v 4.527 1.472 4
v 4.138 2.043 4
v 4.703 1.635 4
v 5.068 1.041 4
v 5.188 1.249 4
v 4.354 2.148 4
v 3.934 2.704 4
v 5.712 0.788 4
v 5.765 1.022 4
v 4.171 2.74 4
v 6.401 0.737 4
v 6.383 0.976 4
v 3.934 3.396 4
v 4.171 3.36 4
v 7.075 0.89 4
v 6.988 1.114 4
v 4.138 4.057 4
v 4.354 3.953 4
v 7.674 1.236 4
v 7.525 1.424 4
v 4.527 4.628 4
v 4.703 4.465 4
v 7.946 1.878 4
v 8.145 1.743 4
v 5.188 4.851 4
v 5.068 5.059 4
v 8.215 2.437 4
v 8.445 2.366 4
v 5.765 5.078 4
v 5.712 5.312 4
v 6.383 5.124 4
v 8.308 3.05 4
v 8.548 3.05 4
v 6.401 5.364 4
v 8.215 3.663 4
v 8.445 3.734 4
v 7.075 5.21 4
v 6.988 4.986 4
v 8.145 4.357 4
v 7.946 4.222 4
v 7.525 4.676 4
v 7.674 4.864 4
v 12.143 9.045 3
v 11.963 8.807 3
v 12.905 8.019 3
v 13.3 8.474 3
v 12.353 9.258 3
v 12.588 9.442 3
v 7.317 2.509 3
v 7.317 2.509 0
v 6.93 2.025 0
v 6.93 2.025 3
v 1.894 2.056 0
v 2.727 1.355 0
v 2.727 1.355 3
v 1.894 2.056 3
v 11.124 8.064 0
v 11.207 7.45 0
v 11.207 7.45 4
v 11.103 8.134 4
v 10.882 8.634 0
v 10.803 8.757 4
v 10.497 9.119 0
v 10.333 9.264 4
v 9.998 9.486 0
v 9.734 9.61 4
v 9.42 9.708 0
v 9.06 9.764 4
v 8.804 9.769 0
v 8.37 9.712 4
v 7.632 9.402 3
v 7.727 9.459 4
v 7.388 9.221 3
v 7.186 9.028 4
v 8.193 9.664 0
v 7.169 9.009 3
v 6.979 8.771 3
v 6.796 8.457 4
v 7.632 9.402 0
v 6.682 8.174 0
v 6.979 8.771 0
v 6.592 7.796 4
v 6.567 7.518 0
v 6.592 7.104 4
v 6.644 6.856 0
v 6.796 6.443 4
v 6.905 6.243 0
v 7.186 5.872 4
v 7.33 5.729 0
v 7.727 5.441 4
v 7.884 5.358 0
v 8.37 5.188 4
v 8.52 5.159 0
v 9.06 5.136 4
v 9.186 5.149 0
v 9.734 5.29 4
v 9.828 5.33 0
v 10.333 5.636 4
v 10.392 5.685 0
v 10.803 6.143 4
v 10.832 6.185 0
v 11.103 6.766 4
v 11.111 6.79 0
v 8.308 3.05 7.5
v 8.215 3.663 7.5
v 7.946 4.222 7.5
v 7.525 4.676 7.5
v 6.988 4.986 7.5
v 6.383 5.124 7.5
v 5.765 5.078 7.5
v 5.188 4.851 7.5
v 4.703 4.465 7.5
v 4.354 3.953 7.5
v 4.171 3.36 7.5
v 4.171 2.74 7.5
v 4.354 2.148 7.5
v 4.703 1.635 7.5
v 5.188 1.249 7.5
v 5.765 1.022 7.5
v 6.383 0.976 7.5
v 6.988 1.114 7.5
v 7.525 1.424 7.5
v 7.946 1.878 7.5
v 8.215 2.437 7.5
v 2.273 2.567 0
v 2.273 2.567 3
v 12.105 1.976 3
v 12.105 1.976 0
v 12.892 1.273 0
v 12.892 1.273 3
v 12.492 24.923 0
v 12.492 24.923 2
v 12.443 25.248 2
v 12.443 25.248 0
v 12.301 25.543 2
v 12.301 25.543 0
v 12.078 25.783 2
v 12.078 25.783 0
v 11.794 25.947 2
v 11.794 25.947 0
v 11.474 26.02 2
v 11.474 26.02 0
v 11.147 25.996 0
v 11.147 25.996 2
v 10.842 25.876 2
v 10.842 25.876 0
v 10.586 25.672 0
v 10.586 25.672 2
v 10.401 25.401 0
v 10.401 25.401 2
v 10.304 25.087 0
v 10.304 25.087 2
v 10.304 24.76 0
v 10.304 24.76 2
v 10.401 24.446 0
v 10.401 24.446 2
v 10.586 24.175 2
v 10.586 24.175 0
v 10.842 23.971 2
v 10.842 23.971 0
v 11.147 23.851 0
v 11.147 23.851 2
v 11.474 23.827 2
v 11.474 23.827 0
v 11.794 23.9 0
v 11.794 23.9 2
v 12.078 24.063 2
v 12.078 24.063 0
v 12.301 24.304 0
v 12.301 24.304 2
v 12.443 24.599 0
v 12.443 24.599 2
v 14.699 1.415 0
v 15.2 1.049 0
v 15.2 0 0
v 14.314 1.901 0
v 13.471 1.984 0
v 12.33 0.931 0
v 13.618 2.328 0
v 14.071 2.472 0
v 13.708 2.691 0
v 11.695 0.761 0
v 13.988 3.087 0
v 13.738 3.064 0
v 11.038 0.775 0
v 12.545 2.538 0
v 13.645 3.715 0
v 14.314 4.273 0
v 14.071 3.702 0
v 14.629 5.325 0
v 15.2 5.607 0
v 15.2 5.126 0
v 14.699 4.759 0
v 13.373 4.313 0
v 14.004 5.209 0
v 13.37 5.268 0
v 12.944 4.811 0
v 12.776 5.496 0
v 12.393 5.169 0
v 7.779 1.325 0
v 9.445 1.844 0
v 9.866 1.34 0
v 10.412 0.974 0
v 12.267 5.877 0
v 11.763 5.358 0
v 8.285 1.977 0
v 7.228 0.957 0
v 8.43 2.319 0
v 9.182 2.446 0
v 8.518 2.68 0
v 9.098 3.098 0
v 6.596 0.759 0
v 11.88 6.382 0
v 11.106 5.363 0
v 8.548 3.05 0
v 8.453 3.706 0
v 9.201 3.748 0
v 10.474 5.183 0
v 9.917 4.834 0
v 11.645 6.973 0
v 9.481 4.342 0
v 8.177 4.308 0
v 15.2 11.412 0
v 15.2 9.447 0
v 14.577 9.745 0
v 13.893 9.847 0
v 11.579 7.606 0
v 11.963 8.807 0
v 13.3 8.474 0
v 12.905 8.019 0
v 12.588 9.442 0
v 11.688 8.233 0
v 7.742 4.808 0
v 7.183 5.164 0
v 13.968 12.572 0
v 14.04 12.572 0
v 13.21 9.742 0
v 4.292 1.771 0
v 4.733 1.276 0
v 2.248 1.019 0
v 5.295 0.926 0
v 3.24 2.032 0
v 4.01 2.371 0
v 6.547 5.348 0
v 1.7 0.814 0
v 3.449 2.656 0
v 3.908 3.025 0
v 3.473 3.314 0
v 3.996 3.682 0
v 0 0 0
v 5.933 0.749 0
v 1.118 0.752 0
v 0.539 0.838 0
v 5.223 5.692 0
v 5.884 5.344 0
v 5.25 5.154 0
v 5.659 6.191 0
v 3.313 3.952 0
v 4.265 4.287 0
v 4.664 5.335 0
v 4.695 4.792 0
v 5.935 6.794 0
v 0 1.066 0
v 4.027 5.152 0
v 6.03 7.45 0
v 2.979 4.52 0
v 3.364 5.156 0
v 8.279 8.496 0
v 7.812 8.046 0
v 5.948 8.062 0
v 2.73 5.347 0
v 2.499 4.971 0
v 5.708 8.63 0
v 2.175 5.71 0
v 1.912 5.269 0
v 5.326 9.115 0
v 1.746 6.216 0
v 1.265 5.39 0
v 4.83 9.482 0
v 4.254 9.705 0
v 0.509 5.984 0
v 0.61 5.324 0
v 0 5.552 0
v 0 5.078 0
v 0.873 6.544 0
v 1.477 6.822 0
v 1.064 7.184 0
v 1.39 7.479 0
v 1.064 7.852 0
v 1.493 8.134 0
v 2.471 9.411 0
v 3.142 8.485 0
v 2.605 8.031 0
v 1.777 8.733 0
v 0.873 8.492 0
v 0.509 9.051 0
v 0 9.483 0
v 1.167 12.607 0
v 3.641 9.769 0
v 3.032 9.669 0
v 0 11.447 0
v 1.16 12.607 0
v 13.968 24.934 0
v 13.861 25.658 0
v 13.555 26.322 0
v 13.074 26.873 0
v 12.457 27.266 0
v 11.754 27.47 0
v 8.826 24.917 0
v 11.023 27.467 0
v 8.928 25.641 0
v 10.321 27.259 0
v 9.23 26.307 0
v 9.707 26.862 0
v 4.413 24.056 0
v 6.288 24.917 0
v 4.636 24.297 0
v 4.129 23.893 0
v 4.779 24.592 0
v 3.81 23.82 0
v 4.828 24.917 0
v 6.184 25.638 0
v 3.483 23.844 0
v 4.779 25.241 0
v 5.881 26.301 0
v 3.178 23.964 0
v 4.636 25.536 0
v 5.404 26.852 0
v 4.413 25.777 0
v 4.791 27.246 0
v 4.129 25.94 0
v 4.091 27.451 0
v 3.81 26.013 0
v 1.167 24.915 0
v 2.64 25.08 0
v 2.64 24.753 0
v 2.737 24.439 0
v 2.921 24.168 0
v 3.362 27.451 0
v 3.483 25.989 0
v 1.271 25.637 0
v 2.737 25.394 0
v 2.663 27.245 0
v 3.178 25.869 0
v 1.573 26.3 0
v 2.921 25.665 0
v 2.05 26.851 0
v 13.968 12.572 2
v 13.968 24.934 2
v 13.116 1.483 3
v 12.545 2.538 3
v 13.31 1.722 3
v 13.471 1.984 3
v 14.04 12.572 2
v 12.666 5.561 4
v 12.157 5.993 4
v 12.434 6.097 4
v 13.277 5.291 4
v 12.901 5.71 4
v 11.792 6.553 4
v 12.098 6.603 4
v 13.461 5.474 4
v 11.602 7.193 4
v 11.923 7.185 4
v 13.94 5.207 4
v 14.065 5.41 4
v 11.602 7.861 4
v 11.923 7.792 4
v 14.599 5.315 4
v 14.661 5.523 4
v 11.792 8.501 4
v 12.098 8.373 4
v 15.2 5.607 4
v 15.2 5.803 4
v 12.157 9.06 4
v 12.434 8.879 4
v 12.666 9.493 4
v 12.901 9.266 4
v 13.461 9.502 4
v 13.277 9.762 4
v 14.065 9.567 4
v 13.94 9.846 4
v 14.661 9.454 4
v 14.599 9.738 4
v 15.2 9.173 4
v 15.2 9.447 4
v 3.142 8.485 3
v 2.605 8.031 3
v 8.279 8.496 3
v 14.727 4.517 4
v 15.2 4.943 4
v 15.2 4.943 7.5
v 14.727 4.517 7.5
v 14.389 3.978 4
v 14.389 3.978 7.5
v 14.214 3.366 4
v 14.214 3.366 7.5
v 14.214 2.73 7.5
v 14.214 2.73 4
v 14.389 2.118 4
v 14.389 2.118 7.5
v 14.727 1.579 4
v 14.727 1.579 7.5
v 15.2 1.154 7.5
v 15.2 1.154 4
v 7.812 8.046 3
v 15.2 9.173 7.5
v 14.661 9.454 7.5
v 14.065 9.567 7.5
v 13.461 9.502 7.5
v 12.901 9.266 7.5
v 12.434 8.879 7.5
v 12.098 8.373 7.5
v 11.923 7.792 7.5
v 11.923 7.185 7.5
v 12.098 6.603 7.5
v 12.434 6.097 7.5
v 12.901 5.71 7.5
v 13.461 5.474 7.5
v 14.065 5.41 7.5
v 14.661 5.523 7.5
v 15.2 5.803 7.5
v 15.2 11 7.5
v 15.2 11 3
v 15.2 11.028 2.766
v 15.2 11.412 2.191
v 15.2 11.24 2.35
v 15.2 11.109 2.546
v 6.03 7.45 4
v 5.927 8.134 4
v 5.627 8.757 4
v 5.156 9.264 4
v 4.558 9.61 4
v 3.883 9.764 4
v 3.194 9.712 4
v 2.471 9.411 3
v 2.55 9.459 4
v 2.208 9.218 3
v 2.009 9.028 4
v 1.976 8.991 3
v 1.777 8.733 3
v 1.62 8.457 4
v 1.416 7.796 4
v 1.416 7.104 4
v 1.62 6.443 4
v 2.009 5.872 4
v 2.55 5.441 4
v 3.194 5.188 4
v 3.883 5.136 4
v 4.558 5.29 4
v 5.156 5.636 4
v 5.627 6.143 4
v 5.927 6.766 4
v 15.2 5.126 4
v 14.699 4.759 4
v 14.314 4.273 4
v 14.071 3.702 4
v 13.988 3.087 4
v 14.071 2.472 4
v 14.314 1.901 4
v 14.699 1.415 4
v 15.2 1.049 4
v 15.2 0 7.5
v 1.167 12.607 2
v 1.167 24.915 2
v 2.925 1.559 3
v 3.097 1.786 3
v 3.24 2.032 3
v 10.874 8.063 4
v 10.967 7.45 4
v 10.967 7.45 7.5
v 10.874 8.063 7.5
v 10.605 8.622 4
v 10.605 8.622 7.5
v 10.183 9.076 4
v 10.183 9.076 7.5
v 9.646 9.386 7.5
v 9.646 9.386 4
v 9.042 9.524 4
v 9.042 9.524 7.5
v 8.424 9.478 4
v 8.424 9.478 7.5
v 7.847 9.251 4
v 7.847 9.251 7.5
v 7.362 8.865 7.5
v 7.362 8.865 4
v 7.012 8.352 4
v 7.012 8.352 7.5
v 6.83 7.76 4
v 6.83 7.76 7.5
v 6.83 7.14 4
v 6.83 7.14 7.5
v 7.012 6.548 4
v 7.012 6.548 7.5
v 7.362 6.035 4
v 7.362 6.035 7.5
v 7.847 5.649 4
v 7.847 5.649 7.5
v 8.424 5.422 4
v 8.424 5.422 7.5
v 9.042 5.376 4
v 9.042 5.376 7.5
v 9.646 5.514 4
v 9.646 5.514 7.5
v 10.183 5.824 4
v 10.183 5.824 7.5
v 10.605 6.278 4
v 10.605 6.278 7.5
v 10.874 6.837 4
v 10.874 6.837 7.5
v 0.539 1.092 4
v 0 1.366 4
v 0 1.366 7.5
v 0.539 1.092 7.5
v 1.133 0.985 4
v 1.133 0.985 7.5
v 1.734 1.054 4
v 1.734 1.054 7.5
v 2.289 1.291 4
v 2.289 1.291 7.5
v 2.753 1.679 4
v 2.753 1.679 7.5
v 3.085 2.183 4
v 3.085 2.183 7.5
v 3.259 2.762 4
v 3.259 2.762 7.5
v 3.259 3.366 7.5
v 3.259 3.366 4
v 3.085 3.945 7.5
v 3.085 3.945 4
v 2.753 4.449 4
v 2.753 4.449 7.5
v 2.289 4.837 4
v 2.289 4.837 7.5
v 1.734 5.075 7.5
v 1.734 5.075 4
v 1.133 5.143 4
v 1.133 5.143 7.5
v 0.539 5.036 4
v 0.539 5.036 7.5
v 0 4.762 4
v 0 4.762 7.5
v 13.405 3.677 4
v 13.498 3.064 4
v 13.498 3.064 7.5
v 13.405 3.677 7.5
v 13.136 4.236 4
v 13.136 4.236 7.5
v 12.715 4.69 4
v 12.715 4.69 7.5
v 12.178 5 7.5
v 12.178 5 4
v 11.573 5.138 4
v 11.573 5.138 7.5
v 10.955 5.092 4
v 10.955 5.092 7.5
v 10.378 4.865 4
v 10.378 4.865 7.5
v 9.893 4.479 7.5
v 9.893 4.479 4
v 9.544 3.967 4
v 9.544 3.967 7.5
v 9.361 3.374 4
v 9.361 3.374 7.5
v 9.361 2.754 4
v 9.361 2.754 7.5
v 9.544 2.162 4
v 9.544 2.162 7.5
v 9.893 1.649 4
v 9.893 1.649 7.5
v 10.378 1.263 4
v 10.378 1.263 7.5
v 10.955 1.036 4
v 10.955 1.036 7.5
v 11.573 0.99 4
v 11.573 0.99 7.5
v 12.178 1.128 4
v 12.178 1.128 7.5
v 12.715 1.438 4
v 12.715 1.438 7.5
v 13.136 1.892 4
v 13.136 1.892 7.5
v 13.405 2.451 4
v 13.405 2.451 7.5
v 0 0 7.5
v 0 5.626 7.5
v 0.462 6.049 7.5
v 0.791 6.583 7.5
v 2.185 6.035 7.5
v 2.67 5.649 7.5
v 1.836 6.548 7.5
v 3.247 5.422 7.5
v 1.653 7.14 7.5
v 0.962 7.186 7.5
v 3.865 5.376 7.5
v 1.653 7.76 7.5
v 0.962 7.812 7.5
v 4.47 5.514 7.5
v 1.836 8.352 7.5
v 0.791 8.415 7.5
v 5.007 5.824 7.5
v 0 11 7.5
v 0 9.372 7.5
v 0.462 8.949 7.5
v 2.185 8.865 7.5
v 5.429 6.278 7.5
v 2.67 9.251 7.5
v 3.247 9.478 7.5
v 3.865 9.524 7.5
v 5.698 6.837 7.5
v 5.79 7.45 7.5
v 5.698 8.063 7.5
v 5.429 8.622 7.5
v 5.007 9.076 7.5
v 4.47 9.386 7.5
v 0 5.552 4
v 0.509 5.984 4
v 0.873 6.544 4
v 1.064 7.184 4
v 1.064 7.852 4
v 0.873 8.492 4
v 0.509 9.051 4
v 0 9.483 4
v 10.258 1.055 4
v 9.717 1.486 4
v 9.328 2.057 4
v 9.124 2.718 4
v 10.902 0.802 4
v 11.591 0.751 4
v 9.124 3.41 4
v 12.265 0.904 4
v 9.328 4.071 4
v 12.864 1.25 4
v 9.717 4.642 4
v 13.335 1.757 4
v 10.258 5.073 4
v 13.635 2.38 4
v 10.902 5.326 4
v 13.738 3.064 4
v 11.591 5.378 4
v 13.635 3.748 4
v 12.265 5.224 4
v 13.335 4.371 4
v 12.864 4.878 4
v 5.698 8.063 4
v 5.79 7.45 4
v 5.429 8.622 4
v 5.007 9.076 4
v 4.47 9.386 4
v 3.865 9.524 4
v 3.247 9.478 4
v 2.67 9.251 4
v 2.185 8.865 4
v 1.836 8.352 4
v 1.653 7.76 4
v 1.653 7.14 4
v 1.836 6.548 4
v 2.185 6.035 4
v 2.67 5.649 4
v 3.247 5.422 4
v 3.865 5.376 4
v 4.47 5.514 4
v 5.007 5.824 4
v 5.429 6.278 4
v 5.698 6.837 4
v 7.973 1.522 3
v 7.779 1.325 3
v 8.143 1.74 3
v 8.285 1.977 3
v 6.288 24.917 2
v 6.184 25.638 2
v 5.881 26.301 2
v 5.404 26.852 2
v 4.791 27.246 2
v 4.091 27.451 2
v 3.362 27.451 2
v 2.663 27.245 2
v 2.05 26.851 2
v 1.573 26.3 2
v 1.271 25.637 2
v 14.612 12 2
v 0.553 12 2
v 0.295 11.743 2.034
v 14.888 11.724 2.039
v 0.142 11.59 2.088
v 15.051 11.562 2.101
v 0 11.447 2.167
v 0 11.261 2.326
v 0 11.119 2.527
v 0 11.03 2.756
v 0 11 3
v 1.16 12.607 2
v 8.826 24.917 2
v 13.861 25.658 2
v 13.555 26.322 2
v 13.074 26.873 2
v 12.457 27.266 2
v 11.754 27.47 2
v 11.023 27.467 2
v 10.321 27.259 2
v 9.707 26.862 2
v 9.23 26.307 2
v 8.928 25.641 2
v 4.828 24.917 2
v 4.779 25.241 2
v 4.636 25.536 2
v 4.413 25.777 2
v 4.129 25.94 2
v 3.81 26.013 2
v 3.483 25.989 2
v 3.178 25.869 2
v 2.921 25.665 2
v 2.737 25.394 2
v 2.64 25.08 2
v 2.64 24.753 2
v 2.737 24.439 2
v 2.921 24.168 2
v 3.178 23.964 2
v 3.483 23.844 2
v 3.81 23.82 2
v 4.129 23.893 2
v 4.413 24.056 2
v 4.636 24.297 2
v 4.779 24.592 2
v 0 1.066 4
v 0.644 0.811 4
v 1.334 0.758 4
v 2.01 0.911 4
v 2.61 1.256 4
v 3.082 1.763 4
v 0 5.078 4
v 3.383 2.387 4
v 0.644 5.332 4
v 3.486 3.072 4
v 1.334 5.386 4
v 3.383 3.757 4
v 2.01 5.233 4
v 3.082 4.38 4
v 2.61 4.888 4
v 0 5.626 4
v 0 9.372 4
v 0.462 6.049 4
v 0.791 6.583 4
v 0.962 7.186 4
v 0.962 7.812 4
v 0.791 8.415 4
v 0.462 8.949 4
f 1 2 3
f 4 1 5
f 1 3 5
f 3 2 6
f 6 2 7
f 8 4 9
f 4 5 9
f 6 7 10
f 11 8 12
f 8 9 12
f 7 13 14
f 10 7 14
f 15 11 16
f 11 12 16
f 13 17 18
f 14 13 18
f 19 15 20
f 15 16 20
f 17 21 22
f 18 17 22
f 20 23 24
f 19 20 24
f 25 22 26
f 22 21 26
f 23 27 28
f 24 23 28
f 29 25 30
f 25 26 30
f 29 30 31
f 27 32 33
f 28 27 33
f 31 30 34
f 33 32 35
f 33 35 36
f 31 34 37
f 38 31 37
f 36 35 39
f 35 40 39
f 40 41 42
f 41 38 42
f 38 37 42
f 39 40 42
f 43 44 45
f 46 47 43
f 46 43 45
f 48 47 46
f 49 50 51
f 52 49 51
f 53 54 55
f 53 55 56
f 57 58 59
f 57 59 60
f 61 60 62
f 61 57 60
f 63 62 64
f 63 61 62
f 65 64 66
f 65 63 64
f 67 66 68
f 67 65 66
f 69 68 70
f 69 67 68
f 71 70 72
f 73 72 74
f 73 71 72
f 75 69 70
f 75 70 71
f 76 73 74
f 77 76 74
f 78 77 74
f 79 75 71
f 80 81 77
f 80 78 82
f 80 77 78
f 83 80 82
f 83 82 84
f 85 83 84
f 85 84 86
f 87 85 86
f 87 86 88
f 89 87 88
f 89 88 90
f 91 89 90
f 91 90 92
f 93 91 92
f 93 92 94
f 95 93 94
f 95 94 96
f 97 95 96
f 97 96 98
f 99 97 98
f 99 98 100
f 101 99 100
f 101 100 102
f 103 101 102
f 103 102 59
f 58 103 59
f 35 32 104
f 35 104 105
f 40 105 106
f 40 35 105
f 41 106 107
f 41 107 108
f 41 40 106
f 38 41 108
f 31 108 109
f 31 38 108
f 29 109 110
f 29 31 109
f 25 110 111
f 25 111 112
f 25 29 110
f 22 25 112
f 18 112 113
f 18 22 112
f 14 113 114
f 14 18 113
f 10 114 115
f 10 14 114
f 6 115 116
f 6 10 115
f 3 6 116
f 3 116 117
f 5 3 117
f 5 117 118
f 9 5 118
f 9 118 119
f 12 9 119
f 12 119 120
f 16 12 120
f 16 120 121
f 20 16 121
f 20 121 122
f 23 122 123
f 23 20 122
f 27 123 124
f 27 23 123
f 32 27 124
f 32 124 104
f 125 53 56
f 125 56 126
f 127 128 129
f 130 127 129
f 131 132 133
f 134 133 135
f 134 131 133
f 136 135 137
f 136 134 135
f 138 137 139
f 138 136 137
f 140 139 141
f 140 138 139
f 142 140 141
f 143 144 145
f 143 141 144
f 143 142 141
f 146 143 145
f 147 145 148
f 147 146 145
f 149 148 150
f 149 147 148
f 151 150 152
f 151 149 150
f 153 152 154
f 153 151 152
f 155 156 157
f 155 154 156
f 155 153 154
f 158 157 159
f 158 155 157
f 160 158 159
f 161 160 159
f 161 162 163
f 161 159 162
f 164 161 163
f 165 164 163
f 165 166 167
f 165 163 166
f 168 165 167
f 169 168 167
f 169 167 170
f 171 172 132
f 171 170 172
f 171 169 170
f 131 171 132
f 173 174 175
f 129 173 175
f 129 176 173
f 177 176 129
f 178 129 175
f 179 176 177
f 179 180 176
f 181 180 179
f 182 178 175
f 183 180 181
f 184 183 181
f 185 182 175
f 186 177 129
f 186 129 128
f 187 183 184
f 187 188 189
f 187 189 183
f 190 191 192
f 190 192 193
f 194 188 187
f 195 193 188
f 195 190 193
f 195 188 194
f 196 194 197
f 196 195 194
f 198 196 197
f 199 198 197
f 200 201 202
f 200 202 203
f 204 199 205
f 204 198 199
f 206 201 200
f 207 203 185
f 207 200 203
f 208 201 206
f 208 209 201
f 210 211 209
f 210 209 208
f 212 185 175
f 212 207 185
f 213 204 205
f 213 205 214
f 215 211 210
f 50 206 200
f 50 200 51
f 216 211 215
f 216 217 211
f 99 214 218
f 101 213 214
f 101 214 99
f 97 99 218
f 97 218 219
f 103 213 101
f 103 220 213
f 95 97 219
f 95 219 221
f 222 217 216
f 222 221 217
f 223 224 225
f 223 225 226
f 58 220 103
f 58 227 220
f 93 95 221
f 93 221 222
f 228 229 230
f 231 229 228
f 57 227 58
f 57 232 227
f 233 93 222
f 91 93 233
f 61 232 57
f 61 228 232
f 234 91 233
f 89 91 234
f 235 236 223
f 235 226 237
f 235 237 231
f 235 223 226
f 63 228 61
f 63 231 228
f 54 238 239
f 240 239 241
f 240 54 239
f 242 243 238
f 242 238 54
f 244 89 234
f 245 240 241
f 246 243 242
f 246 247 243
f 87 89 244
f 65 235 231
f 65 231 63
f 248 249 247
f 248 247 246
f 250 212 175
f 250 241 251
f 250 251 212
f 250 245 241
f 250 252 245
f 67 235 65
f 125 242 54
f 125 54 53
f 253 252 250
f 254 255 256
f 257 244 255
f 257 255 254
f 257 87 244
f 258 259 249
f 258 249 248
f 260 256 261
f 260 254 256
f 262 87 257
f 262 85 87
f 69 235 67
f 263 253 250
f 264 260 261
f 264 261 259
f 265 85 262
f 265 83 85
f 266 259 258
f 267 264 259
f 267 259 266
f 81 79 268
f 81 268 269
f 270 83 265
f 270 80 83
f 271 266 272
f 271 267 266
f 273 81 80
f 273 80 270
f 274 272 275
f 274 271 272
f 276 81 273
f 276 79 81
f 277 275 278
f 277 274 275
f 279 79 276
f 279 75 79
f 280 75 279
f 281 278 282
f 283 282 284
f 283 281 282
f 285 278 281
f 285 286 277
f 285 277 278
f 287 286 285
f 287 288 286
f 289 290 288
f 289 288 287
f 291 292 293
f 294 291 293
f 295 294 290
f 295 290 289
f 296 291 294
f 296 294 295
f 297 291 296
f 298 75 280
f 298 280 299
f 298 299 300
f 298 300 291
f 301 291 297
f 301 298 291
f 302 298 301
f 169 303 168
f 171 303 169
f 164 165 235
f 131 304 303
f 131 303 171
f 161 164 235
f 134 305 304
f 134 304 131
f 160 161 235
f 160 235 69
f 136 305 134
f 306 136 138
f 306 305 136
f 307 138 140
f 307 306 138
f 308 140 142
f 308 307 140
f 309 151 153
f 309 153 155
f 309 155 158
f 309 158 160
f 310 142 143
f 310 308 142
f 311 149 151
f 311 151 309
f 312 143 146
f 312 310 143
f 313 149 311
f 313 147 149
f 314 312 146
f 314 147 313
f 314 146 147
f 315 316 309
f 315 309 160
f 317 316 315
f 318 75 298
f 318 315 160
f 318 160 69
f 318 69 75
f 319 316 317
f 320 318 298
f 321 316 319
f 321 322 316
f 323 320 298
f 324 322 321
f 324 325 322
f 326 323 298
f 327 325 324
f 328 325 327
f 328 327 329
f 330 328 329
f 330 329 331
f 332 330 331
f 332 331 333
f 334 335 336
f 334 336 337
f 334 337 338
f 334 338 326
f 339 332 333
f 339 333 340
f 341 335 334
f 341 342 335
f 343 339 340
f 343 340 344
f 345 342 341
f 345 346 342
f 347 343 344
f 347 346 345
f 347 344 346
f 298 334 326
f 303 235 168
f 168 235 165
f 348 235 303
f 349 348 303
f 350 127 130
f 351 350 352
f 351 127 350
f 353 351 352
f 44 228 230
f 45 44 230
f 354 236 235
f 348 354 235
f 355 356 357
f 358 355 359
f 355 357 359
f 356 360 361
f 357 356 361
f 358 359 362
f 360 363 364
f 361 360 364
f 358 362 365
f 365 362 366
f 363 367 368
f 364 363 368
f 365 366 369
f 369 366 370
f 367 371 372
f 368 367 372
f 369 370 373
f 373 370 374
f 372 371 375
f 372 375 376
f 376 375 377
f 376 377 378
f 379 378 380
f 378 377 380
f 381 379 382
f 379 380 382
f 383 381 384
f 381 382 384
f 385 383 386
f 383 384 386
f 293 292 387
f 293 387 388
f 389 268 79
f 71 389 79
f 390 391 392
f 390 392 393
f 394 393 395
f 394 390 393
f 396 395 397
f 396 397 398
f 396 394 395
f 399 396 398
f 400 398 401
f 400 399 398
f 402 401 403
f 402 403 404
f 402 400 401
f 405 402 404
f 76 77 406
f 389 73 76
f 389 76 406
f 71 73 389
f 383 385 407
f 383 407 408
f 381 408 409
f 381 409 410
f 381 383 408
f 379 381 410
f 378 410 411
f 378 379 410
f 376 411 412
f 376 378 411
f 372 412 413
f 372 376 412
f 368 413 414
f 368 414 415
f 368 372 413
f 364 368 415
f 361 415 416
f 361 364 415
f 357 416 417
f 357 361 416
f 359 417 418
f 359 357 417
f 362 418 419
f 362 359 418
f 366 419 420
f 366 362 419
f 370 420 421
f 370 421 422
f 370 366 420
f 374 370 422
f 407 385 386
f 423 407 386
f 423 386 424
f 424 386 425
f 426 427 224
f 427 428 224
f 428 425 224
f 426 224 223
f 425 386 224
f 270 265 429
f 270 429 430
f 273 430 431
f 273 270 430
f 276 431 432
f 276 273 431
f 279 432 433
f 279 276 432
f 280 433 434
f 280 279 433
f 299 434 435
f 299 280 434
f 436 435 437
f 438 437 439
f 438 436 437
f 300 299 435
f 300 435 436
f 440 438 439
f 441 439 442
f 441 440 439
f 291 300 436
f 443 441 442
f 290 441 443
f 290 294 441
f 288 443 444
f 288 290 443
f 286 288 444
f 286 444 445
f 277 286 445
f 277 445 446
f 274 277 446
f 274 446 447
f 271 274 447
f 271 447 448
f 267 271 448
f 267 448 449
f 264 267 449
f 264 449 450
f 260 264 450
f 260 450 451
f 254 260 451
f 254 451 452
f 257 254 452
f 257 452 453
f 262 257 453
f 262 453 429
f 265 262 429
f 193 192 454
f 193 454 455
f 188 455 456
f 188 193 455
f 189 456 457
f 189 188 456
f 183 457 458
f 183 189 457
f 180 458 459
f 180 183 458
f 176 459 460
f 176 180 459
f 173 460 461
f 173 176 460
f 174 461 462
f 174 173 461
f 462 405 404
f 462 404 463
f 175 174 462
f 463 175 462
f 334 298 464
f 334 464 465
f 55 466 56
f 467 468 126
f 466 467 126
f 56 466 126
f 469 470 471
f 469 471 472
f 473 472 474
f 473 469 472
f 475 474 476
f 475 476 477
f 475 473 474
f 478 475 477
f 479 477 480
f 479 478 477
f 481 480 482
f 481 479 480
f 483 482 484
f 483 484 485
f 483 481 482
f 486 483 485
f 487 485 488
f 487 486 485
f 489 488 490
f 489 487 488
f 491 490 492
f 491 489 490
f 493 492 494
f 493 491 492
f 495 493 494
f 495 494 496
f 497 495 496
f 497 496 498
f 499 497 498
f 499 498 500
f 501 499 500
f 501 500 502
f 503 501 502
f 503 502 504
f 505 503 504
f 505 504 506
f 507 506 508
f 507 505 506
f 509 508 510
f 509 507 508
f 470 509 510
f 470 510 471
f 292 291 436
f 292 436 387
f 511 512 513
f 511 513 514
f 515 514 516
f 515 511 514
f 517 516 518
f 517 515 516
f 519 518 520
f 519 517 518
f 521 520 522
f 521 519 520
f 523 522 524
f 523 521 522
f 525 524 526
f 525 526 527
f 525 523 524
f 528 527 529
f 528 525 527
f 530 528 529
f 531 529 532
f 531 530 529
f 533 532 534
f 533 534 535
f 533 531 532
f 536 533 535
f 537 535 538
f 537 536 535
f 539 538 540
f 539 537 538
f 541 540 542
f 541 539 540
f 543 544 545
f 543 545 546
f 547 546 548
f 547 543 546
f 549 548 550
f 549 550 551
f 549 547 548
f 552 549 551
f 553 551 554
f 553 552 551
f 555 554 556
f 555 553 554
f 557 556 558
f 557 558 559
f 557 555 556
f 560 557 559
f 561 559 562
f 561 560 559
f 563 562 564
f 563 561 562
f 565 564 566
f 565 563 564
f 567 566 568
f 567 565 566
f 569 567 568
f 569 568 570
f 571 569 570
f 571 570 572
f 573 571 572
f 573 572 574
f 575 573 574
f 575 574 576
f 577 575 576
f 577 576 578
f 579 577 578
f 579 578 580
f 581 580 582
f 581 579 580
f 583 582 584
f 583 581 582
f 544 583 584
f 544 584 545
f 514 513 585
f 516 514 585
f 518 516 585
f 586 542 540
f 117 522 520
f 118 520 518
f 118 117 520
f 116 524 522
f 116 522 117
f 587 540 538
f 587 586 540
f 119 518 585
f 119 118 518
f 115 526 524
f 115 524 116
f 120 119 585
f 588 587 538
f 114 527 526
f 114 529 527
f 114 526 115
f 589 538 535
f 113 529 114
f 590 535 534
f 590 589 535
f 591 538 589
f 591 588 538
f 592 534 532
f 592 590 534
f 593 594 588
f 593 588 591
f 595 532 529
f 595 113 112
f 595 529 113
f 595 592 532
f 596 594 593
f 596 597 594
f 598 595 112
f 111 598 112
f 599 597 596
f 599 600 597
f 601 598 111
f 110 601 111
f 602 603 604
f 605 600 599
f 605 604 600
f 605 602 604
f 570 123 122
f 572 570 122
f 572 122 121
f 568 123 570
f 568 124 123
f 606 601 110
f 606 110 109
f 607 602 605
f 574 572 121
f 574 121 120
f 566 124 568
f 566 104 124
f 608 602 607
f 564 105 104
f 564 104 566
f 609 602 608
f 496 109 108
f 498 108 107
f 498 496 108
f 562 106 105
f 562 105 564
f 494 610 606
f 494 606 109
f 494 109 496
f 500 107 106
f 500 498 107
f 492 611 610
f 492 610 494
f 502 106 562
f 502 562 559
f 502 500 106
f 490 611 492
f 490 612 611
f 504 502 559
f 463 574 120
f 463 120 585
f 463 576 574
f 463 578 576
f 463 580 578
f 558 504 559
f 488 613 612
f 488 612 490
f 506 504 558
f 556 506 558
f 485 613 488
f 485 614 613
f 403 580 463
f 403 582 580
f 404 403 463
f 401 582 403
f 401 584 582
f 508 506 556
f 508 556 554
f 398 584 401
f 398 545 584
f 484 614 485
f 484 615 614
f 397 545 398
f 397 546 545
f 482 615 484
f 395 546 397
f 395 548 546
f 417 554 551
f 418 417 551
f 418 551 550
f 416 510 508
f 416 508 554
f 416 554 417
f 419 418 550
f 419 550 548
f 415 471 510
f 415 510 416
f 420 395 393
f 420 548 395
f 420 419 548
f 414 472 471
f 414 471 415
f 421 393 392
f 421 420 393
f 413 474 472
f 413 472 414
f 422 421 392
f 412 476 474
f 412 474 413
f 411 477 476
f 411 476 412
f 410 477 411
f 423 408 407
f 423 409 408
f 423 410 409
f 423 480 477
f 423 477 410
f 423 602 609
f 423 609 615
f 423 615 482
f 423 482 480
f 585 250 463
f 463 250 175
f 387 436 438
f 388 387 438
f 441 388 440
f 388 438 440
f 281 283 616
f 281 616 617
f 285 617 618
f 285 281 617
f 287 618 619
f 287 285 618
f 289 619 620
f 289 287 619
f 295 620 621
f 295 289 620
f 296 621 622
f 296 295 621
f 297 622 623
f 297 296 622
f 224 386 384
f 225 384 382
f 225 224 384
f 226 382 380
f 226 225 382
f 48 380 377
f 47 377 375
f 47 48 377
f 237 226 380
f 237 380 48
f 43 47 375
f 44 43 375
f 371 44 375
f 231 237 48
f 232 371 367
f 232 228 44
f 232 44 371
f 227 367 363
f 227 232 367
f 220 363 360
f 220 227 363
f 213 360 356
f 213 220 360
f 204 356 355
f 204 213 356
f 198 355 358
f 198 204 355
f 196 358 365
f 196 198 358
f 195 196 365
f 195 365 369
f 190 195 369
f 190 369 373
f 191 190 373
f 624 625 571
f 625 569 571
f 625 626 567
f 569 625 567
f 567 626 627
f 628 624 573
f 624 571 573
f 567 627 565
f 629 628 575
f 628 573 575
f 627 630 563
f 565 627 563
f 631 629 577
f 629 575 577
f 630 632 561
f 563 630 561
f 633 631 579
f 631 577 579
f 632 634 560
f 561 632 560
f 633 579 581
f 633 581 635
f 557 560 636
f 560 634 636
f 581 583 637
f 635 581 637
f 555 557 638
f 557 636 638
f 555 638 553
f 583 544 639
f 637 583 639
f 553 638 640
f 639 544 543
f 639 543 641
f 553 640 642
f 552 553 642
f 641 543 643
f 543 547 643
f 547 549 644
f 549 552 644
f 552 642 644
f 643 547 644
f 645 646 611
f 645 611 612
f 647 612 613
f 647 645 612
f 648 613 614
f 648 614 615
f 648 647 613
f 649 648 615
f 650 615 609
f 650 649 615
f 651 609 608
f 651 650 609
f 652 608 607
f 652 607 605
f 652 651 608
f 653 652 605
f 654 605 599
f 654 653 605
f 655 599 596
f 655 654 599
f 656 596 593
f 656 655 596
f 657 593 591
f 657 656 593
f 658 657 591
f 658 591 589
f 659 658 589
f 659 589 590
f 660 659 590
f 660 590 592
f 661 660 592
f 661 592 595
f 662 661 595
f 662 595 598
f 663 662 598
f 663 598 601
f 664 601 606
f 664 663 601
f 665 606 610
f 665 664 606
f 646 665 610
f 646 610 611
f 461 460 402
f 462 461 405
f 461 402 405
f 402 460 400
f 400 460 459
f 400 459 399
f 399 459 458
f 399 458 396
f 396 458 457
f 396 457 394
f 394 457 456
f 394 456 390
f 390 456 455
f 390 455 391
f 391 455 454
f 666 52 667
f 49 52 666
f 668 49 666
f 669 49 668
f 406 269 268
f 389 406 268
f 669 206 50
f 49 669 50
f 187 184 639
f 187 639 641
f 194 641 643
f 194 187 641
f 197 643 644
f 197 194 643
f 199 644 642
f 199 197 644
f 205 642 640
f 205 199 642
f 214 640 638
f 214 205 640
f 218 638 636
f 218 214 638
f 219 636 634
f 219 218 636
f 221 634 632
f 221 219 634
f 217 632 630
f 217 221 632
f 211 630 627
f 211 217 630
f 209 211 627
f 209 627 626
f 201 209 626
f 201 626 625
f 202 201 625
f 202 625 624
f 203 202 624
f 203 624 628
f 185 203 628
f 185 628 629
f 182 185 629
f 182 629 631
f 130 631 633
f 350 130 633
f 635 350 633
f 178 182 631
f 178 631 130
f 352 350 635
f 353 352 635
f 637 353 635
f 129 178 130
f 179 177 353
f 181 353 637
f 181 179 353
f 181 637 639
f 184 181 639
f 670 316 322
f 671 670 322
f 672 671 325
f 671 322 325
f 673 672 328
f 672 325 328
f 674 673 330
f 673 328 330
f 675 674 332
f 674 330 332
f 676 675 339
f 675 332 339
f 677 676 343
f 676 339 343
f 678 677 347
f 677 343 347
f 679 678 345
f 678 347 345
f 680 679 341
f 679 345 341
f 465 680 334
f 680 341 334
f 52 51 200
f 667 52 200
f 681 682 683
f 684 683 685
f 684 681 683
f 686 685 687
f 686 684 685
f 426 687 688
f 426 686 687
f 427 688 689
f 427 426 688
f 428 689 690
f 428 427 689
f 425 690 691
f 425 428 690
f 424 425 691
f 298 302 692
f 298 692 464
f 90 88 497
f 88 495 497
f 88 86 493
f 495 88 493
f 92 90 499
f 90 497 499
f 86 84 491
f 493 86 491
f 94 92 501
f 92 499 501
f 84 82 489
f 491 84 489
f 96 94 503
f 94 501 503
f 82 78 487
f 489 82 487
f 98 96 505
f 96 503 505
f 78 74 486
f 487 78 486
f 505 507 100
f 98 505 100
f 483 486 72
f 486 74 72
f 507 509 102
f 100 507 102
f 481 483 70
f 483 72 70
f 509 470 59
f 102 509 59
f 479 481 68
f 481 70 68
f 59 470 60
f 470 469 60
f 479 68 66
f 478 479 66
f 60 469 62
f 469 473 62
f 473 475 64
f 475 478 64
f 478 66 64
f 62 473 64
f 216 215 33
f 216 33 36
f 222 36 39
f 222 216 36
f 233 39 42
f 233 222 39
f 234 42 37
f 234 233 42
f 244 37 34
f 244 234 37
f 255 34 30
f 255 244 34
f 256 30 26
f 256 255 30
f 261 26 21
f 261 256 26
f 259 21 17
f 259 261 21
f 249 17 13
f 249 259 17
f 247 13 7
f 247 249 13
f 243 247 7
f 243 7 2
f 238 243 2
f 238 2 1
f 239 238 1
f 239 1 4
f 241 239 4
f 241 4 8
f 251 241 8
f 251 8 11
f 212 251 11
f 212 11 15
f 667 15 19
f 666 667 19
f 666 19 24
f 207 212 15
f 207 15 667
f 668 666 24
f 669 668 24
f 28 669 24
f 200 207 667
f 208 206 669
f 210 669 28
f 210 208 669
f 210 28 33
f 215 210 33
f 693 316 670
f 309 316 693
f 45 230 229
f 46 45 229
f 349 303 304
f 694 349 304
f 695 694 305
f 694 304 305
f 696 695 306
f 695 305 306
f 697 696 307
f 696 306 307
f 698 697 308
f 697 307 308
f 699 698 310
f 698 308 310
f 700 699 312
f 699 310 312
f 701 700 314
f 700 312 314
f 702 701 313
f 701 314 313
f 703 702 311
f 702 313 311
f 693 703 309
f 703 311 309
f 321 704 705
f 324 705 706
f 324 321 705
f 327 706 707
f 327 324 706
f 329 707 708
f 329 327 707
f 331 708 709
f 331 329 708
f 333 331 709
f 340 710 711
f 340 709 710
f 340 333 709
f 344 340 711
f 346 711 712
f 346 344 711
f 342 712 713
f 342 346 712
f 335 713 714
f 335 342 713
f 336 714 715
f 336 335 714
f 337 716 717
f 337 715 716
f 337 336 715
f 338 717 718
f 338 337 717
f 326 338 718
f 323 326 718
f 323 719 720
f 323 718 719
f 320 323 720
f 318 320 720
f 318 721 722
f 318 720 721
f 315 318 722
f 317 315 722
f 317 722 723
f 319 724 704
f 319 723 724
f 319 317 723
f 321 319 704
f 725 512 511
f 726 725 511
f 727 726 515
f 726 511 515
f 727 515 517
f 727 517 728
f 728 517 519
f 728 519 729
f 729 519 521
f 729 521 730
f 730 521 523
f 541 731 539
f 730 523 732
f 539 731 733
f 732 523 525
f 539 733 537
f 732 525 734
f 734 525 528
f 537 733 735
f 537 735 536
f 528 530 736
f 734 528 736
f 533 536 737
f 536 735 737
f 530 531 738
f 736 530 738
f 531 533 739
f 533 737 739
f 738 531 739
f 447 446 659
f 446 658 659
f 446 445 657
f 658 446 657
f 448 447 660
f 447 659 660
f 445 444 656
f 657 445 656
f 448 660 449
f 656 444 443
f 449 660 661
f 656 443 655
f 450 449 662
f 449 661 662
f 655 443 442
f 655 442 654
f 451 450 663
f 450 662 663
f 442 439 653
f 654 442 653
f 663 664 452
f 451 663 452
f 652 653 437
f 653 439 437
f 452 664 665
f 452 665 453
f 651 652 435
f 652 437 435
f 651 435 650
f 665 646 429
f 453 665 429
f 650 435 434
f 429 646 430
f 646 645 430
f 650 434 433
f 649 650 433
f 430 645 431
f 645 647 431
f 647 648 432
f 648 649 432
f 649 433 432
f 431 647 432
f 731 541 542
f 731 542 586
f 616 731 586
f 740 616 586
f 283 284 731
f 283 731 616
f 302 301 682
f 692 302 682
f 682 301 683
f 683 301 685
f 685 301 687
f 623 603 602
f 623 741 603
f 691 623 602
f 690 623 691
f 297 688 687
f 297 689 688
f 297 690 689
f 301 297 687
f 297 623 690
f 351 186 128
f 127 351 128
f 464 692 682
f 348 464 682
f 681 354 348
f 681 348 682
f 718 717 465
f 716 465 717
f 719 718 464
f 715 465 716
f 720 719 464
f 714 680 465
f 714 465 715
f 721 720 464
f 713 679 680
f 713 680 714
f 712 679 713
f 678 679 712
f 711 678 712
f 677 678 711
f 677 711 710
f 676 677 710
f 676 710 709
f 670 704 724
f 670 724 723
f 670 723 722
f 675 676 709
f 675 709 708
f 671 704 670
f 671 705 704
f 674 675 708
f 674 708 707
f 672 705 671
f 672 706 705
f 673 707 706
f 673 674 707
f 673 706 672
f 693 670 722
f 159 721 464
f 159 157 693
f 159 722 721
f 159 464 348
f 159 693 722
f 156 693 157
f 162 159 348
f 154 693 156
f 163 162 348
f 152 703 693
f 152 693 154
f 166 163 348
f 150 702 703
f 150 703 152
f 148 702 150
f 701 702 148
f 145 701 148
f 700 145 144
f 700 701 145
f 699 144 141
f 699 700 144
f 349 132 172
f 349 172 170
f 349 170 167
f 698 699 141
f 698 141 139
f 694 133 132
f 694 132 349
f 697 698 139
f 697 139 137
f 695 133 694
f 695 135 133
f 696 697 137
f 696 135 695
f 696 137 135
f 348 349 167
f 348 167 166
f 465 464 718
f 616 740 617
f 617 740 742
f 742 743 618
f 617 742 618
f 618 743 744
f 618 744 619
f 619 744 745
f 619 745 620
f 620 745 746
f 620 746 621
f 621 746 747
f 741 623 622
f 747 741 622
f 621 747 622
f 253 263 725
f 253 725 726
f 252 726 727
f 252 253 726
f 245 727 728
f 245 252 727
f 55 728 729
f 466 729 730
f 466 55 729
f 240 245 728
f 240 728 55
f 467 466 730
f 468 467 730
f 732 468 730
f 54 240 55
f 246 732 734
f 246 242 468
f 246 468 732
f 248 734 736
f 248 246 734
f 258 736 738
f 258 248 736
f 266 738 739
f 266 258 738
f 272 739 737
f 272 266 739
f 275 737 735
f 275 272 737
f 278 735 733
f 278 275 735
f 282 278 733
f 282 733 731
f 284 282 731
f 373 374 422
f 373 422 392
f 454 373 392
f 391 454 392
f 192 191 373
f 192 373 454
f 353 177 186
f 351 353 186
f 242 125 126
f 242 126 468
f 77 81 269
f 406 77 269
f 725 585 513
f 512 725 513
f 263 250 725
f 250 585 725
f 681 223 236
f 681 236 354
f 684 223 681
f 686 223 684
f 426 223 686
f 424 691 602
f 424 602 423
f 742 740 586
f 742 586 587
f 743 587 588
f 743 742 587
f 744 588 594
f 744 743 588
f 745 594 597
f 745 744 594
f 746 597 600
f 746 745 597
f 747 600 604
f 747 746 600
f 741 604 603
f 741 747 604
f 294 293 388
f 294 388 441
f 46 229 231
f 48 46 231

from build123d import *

# Parameters (mm, degrees)
BOX_W         = 15.2
BOX_H         = 18
BOX_DEPTH     = 10
PAD003_DEPTH  = 3
SKETCH002_R   = 2.08
PAD002_DEPTH  = 3.5
SKETCH001_R   = 1.1
SKETCH001_R_2 = 2.32
PAD001_DEPTH  = 4
CHAMFER_SIZE  = 1.16
FILLET_R      = 1


with BuildPart() as w_rfel:
    # Box → Box (new body)
    with BuildSketch(Plane(origin=(0, 11, 2), x_dir=(1, 0, 0), z_dir=(0, 0, 1))):
        with Locations((7.6, 9)):
            Rectangle(BOX_W, BOX_H)
    extrude(amount=BOX_DEPTH)


with BuildPart() as pad003:
    # Sketch003 → Pad003 (new body)
    with BuildSketch(Plane.XY):
        Polygon((2.378666, 9.538552), (3.141544, 8.484614), (2.605246, 8.030906), (1.603856, 8.879459), align=None)
        Polygon((6.78436, 8.940759), (7.81191, 8.046443), (8.278705, 8.496499), (7.513181, 9.568461), align=None)
        Polygon((11.639661, 9.077468), (12.904972, 8.018862), (13.299574, 8.474274), (12.400975, 9.695749), align=None)
        Polygon((12.104583, 1.976359), (13.30563, 0.90266), (13.898616, 1.728947), (12.545185, 2.537632), align=None)
        Polygon((8.700089, 1.748501), (7.31743, 2.508724), (6.930422, 2.025162), (8.137034, 1.029802), align=None)
        Polygon((2.273056, 2.567461), (3.508846, 1.882398), (2.897784, 1.211809), (1.893881, 2.05588), align=None)
    extrude(amount=PAD003_DEPTH)


with BuildPart() as pad002:
    # Sketch002 → Pad002 (new body)
    with BuildSketch(Plane.XY.offset(4)):
        with BuildLine():
            Line((0, 0), (15.2, 0))
            Line((15.2, 1.15374), (15.2, 0))
            ThreePointArc((15.2, 4.942574), (14.191377, 3.048157), (15.2, 1.15374))
            Line((15.2, 5.803221), (15.2, 4.942574))
            ThreePointArc((15.2, 9.17326), (11.900529, 7.488241), (15.2, 5.803221))
            Line((15.2, 9.17326), (15.2, 11))
            Line((0, 11), (15.2, 11))
            Line((0, 9.37218), (0, 11))
            ThreePointArc((0, 5.625638), (0.983556, 7.498909), (0, 9.37218))
            Line((0, 4.762372), (0, 5.625638))
            ThreePointArc((0, 1.365976), (3.281052, 3.064174), (0, 4.762372))
            Line((0, 0), (0, 1.365976))
        make_face()
        with Locations((3.71, 7.45)):
            Circle(SKETCH002_R, mode=Mode.SUBTRACT)
        with Locations((8.886504, 7.45)):
            Circle(SKETCH002_R, mode=Mode.SUBTRACT)
        with Locations((11.417808, 3.064059)):
            Circle(SKETCH002_R, mode=Mode.SUBTRACT)
        with Locations((6.227885, 3.050071)):
            Circle(SKETCH002_R, mode=Mode.SUBTRACT)
    extrude(amount=PAD002_DEPTH)


with BuildPart() as cut:
    # Sketch001 → Pad001 (new body)
    with BuildSketch(Plane.XY):
        with BuildLine():
            Line((1.167192, 12.607396), (1.167192, 24.915267))
            ThreePointArc((6.287975, 24.916916), (3.726759, 27.476896), (1.167192, 24.915267))
            Line((6.287975, 24.916916), (8.825715, 24.916916))
            ThreePointArc((13.968192, 24.934157), (11.38834, 27.49472), (8.825715, 24.916916))
            Line((13.968192, 12.572419), (13.968192, 24.934157))
            Line((15.2, 12.572419), (13.968192, 12.572419))
            Line((15.2, 9.446953), (15.2, 12.572419))
            ThreePointArc((15.2, 9.446953), (11.577912, 7.526805), (15.2, 5.606658))
            Line((15.2, 5.606658), (15.2, 5.125616))
            ThreePointArc((15.2, 5.125616), (13.98768, 3.087125), (15.2, 1.048634))
            Line((15.2, 1.048634), (15.2, 0))
            Line((0, 0), (15.2, 0))
            Line((0, 0), (0, 1.066252))
            ThreePointArc((0, 1.066252), (3.486123, 3.071883), (0, 5.077515))
            Line((0, 5.077515), (0, 5.551994))
            ThreePointArc((0, 5.551994), (1.087704, 7.51766), (0, 9.483327))
            Line((0, 9.483327), (0, 12.607396))
            Line((0, 12.607396), (1.167192, 12.607396))
        make_face()
        with Locations((3.727584, 24.916504)):
            Circle(SKETCH001_R, mode=Mode.SUBTRACT)
        with Locations((11.392031, 24.923481)):
            Circle(SKETCH001_R, mode=Mode.SUBTRACT)
        with Locations((3.71, 7.45)):
            Circle(SKETCH001_R_2, mode=Mode.SUBTRACT)
        with Locations((8.886504, 7.45)):
            Circle(SKETCH001_R_2, mode=Mode.SUBTRACT)
        with Locations((11.417808, 3.064059)):
            Circle(SKETCH001_R_2, mode=Mode.SUBTRACT)
        with Locations((6.227885, 3.050071)):
            Circle(SKETCH001_R_2, mode=Mode.SUBTRACT)
    extrude(amount=PAD001_DEPTH)

    # Chamfer
    chamfer_edges = [cut.edges().sort_by_distance(p)[0] for p in [
        (0, 12.607396, 2),
        (15.2, 12.572419, 2),
    ]]
    chamfer(chamfer_edges, length=CHAMFER_SIZE)

    # Fusion: union Pad003, Pad002
    add(pad003.part)
    add(pad002.part)

    # Cut: cut Würfel
    add(w_rfel.part, mode=Mode.SUBTRACT)


with BuildPart() as motorholder:
    # Fillet base: copy of Cut
    add(cut.part)

    # Fillet
    fillet_edges = [motorholder.edges().sort_by_distance(p)[0] for p in [
        (7.6, 11, 2),
    ]]
    fillet(fillet_edges, radius=FILLET_R)

    # Fusion001: union Cut
    add(cut.part)


solid = motorholder.part
